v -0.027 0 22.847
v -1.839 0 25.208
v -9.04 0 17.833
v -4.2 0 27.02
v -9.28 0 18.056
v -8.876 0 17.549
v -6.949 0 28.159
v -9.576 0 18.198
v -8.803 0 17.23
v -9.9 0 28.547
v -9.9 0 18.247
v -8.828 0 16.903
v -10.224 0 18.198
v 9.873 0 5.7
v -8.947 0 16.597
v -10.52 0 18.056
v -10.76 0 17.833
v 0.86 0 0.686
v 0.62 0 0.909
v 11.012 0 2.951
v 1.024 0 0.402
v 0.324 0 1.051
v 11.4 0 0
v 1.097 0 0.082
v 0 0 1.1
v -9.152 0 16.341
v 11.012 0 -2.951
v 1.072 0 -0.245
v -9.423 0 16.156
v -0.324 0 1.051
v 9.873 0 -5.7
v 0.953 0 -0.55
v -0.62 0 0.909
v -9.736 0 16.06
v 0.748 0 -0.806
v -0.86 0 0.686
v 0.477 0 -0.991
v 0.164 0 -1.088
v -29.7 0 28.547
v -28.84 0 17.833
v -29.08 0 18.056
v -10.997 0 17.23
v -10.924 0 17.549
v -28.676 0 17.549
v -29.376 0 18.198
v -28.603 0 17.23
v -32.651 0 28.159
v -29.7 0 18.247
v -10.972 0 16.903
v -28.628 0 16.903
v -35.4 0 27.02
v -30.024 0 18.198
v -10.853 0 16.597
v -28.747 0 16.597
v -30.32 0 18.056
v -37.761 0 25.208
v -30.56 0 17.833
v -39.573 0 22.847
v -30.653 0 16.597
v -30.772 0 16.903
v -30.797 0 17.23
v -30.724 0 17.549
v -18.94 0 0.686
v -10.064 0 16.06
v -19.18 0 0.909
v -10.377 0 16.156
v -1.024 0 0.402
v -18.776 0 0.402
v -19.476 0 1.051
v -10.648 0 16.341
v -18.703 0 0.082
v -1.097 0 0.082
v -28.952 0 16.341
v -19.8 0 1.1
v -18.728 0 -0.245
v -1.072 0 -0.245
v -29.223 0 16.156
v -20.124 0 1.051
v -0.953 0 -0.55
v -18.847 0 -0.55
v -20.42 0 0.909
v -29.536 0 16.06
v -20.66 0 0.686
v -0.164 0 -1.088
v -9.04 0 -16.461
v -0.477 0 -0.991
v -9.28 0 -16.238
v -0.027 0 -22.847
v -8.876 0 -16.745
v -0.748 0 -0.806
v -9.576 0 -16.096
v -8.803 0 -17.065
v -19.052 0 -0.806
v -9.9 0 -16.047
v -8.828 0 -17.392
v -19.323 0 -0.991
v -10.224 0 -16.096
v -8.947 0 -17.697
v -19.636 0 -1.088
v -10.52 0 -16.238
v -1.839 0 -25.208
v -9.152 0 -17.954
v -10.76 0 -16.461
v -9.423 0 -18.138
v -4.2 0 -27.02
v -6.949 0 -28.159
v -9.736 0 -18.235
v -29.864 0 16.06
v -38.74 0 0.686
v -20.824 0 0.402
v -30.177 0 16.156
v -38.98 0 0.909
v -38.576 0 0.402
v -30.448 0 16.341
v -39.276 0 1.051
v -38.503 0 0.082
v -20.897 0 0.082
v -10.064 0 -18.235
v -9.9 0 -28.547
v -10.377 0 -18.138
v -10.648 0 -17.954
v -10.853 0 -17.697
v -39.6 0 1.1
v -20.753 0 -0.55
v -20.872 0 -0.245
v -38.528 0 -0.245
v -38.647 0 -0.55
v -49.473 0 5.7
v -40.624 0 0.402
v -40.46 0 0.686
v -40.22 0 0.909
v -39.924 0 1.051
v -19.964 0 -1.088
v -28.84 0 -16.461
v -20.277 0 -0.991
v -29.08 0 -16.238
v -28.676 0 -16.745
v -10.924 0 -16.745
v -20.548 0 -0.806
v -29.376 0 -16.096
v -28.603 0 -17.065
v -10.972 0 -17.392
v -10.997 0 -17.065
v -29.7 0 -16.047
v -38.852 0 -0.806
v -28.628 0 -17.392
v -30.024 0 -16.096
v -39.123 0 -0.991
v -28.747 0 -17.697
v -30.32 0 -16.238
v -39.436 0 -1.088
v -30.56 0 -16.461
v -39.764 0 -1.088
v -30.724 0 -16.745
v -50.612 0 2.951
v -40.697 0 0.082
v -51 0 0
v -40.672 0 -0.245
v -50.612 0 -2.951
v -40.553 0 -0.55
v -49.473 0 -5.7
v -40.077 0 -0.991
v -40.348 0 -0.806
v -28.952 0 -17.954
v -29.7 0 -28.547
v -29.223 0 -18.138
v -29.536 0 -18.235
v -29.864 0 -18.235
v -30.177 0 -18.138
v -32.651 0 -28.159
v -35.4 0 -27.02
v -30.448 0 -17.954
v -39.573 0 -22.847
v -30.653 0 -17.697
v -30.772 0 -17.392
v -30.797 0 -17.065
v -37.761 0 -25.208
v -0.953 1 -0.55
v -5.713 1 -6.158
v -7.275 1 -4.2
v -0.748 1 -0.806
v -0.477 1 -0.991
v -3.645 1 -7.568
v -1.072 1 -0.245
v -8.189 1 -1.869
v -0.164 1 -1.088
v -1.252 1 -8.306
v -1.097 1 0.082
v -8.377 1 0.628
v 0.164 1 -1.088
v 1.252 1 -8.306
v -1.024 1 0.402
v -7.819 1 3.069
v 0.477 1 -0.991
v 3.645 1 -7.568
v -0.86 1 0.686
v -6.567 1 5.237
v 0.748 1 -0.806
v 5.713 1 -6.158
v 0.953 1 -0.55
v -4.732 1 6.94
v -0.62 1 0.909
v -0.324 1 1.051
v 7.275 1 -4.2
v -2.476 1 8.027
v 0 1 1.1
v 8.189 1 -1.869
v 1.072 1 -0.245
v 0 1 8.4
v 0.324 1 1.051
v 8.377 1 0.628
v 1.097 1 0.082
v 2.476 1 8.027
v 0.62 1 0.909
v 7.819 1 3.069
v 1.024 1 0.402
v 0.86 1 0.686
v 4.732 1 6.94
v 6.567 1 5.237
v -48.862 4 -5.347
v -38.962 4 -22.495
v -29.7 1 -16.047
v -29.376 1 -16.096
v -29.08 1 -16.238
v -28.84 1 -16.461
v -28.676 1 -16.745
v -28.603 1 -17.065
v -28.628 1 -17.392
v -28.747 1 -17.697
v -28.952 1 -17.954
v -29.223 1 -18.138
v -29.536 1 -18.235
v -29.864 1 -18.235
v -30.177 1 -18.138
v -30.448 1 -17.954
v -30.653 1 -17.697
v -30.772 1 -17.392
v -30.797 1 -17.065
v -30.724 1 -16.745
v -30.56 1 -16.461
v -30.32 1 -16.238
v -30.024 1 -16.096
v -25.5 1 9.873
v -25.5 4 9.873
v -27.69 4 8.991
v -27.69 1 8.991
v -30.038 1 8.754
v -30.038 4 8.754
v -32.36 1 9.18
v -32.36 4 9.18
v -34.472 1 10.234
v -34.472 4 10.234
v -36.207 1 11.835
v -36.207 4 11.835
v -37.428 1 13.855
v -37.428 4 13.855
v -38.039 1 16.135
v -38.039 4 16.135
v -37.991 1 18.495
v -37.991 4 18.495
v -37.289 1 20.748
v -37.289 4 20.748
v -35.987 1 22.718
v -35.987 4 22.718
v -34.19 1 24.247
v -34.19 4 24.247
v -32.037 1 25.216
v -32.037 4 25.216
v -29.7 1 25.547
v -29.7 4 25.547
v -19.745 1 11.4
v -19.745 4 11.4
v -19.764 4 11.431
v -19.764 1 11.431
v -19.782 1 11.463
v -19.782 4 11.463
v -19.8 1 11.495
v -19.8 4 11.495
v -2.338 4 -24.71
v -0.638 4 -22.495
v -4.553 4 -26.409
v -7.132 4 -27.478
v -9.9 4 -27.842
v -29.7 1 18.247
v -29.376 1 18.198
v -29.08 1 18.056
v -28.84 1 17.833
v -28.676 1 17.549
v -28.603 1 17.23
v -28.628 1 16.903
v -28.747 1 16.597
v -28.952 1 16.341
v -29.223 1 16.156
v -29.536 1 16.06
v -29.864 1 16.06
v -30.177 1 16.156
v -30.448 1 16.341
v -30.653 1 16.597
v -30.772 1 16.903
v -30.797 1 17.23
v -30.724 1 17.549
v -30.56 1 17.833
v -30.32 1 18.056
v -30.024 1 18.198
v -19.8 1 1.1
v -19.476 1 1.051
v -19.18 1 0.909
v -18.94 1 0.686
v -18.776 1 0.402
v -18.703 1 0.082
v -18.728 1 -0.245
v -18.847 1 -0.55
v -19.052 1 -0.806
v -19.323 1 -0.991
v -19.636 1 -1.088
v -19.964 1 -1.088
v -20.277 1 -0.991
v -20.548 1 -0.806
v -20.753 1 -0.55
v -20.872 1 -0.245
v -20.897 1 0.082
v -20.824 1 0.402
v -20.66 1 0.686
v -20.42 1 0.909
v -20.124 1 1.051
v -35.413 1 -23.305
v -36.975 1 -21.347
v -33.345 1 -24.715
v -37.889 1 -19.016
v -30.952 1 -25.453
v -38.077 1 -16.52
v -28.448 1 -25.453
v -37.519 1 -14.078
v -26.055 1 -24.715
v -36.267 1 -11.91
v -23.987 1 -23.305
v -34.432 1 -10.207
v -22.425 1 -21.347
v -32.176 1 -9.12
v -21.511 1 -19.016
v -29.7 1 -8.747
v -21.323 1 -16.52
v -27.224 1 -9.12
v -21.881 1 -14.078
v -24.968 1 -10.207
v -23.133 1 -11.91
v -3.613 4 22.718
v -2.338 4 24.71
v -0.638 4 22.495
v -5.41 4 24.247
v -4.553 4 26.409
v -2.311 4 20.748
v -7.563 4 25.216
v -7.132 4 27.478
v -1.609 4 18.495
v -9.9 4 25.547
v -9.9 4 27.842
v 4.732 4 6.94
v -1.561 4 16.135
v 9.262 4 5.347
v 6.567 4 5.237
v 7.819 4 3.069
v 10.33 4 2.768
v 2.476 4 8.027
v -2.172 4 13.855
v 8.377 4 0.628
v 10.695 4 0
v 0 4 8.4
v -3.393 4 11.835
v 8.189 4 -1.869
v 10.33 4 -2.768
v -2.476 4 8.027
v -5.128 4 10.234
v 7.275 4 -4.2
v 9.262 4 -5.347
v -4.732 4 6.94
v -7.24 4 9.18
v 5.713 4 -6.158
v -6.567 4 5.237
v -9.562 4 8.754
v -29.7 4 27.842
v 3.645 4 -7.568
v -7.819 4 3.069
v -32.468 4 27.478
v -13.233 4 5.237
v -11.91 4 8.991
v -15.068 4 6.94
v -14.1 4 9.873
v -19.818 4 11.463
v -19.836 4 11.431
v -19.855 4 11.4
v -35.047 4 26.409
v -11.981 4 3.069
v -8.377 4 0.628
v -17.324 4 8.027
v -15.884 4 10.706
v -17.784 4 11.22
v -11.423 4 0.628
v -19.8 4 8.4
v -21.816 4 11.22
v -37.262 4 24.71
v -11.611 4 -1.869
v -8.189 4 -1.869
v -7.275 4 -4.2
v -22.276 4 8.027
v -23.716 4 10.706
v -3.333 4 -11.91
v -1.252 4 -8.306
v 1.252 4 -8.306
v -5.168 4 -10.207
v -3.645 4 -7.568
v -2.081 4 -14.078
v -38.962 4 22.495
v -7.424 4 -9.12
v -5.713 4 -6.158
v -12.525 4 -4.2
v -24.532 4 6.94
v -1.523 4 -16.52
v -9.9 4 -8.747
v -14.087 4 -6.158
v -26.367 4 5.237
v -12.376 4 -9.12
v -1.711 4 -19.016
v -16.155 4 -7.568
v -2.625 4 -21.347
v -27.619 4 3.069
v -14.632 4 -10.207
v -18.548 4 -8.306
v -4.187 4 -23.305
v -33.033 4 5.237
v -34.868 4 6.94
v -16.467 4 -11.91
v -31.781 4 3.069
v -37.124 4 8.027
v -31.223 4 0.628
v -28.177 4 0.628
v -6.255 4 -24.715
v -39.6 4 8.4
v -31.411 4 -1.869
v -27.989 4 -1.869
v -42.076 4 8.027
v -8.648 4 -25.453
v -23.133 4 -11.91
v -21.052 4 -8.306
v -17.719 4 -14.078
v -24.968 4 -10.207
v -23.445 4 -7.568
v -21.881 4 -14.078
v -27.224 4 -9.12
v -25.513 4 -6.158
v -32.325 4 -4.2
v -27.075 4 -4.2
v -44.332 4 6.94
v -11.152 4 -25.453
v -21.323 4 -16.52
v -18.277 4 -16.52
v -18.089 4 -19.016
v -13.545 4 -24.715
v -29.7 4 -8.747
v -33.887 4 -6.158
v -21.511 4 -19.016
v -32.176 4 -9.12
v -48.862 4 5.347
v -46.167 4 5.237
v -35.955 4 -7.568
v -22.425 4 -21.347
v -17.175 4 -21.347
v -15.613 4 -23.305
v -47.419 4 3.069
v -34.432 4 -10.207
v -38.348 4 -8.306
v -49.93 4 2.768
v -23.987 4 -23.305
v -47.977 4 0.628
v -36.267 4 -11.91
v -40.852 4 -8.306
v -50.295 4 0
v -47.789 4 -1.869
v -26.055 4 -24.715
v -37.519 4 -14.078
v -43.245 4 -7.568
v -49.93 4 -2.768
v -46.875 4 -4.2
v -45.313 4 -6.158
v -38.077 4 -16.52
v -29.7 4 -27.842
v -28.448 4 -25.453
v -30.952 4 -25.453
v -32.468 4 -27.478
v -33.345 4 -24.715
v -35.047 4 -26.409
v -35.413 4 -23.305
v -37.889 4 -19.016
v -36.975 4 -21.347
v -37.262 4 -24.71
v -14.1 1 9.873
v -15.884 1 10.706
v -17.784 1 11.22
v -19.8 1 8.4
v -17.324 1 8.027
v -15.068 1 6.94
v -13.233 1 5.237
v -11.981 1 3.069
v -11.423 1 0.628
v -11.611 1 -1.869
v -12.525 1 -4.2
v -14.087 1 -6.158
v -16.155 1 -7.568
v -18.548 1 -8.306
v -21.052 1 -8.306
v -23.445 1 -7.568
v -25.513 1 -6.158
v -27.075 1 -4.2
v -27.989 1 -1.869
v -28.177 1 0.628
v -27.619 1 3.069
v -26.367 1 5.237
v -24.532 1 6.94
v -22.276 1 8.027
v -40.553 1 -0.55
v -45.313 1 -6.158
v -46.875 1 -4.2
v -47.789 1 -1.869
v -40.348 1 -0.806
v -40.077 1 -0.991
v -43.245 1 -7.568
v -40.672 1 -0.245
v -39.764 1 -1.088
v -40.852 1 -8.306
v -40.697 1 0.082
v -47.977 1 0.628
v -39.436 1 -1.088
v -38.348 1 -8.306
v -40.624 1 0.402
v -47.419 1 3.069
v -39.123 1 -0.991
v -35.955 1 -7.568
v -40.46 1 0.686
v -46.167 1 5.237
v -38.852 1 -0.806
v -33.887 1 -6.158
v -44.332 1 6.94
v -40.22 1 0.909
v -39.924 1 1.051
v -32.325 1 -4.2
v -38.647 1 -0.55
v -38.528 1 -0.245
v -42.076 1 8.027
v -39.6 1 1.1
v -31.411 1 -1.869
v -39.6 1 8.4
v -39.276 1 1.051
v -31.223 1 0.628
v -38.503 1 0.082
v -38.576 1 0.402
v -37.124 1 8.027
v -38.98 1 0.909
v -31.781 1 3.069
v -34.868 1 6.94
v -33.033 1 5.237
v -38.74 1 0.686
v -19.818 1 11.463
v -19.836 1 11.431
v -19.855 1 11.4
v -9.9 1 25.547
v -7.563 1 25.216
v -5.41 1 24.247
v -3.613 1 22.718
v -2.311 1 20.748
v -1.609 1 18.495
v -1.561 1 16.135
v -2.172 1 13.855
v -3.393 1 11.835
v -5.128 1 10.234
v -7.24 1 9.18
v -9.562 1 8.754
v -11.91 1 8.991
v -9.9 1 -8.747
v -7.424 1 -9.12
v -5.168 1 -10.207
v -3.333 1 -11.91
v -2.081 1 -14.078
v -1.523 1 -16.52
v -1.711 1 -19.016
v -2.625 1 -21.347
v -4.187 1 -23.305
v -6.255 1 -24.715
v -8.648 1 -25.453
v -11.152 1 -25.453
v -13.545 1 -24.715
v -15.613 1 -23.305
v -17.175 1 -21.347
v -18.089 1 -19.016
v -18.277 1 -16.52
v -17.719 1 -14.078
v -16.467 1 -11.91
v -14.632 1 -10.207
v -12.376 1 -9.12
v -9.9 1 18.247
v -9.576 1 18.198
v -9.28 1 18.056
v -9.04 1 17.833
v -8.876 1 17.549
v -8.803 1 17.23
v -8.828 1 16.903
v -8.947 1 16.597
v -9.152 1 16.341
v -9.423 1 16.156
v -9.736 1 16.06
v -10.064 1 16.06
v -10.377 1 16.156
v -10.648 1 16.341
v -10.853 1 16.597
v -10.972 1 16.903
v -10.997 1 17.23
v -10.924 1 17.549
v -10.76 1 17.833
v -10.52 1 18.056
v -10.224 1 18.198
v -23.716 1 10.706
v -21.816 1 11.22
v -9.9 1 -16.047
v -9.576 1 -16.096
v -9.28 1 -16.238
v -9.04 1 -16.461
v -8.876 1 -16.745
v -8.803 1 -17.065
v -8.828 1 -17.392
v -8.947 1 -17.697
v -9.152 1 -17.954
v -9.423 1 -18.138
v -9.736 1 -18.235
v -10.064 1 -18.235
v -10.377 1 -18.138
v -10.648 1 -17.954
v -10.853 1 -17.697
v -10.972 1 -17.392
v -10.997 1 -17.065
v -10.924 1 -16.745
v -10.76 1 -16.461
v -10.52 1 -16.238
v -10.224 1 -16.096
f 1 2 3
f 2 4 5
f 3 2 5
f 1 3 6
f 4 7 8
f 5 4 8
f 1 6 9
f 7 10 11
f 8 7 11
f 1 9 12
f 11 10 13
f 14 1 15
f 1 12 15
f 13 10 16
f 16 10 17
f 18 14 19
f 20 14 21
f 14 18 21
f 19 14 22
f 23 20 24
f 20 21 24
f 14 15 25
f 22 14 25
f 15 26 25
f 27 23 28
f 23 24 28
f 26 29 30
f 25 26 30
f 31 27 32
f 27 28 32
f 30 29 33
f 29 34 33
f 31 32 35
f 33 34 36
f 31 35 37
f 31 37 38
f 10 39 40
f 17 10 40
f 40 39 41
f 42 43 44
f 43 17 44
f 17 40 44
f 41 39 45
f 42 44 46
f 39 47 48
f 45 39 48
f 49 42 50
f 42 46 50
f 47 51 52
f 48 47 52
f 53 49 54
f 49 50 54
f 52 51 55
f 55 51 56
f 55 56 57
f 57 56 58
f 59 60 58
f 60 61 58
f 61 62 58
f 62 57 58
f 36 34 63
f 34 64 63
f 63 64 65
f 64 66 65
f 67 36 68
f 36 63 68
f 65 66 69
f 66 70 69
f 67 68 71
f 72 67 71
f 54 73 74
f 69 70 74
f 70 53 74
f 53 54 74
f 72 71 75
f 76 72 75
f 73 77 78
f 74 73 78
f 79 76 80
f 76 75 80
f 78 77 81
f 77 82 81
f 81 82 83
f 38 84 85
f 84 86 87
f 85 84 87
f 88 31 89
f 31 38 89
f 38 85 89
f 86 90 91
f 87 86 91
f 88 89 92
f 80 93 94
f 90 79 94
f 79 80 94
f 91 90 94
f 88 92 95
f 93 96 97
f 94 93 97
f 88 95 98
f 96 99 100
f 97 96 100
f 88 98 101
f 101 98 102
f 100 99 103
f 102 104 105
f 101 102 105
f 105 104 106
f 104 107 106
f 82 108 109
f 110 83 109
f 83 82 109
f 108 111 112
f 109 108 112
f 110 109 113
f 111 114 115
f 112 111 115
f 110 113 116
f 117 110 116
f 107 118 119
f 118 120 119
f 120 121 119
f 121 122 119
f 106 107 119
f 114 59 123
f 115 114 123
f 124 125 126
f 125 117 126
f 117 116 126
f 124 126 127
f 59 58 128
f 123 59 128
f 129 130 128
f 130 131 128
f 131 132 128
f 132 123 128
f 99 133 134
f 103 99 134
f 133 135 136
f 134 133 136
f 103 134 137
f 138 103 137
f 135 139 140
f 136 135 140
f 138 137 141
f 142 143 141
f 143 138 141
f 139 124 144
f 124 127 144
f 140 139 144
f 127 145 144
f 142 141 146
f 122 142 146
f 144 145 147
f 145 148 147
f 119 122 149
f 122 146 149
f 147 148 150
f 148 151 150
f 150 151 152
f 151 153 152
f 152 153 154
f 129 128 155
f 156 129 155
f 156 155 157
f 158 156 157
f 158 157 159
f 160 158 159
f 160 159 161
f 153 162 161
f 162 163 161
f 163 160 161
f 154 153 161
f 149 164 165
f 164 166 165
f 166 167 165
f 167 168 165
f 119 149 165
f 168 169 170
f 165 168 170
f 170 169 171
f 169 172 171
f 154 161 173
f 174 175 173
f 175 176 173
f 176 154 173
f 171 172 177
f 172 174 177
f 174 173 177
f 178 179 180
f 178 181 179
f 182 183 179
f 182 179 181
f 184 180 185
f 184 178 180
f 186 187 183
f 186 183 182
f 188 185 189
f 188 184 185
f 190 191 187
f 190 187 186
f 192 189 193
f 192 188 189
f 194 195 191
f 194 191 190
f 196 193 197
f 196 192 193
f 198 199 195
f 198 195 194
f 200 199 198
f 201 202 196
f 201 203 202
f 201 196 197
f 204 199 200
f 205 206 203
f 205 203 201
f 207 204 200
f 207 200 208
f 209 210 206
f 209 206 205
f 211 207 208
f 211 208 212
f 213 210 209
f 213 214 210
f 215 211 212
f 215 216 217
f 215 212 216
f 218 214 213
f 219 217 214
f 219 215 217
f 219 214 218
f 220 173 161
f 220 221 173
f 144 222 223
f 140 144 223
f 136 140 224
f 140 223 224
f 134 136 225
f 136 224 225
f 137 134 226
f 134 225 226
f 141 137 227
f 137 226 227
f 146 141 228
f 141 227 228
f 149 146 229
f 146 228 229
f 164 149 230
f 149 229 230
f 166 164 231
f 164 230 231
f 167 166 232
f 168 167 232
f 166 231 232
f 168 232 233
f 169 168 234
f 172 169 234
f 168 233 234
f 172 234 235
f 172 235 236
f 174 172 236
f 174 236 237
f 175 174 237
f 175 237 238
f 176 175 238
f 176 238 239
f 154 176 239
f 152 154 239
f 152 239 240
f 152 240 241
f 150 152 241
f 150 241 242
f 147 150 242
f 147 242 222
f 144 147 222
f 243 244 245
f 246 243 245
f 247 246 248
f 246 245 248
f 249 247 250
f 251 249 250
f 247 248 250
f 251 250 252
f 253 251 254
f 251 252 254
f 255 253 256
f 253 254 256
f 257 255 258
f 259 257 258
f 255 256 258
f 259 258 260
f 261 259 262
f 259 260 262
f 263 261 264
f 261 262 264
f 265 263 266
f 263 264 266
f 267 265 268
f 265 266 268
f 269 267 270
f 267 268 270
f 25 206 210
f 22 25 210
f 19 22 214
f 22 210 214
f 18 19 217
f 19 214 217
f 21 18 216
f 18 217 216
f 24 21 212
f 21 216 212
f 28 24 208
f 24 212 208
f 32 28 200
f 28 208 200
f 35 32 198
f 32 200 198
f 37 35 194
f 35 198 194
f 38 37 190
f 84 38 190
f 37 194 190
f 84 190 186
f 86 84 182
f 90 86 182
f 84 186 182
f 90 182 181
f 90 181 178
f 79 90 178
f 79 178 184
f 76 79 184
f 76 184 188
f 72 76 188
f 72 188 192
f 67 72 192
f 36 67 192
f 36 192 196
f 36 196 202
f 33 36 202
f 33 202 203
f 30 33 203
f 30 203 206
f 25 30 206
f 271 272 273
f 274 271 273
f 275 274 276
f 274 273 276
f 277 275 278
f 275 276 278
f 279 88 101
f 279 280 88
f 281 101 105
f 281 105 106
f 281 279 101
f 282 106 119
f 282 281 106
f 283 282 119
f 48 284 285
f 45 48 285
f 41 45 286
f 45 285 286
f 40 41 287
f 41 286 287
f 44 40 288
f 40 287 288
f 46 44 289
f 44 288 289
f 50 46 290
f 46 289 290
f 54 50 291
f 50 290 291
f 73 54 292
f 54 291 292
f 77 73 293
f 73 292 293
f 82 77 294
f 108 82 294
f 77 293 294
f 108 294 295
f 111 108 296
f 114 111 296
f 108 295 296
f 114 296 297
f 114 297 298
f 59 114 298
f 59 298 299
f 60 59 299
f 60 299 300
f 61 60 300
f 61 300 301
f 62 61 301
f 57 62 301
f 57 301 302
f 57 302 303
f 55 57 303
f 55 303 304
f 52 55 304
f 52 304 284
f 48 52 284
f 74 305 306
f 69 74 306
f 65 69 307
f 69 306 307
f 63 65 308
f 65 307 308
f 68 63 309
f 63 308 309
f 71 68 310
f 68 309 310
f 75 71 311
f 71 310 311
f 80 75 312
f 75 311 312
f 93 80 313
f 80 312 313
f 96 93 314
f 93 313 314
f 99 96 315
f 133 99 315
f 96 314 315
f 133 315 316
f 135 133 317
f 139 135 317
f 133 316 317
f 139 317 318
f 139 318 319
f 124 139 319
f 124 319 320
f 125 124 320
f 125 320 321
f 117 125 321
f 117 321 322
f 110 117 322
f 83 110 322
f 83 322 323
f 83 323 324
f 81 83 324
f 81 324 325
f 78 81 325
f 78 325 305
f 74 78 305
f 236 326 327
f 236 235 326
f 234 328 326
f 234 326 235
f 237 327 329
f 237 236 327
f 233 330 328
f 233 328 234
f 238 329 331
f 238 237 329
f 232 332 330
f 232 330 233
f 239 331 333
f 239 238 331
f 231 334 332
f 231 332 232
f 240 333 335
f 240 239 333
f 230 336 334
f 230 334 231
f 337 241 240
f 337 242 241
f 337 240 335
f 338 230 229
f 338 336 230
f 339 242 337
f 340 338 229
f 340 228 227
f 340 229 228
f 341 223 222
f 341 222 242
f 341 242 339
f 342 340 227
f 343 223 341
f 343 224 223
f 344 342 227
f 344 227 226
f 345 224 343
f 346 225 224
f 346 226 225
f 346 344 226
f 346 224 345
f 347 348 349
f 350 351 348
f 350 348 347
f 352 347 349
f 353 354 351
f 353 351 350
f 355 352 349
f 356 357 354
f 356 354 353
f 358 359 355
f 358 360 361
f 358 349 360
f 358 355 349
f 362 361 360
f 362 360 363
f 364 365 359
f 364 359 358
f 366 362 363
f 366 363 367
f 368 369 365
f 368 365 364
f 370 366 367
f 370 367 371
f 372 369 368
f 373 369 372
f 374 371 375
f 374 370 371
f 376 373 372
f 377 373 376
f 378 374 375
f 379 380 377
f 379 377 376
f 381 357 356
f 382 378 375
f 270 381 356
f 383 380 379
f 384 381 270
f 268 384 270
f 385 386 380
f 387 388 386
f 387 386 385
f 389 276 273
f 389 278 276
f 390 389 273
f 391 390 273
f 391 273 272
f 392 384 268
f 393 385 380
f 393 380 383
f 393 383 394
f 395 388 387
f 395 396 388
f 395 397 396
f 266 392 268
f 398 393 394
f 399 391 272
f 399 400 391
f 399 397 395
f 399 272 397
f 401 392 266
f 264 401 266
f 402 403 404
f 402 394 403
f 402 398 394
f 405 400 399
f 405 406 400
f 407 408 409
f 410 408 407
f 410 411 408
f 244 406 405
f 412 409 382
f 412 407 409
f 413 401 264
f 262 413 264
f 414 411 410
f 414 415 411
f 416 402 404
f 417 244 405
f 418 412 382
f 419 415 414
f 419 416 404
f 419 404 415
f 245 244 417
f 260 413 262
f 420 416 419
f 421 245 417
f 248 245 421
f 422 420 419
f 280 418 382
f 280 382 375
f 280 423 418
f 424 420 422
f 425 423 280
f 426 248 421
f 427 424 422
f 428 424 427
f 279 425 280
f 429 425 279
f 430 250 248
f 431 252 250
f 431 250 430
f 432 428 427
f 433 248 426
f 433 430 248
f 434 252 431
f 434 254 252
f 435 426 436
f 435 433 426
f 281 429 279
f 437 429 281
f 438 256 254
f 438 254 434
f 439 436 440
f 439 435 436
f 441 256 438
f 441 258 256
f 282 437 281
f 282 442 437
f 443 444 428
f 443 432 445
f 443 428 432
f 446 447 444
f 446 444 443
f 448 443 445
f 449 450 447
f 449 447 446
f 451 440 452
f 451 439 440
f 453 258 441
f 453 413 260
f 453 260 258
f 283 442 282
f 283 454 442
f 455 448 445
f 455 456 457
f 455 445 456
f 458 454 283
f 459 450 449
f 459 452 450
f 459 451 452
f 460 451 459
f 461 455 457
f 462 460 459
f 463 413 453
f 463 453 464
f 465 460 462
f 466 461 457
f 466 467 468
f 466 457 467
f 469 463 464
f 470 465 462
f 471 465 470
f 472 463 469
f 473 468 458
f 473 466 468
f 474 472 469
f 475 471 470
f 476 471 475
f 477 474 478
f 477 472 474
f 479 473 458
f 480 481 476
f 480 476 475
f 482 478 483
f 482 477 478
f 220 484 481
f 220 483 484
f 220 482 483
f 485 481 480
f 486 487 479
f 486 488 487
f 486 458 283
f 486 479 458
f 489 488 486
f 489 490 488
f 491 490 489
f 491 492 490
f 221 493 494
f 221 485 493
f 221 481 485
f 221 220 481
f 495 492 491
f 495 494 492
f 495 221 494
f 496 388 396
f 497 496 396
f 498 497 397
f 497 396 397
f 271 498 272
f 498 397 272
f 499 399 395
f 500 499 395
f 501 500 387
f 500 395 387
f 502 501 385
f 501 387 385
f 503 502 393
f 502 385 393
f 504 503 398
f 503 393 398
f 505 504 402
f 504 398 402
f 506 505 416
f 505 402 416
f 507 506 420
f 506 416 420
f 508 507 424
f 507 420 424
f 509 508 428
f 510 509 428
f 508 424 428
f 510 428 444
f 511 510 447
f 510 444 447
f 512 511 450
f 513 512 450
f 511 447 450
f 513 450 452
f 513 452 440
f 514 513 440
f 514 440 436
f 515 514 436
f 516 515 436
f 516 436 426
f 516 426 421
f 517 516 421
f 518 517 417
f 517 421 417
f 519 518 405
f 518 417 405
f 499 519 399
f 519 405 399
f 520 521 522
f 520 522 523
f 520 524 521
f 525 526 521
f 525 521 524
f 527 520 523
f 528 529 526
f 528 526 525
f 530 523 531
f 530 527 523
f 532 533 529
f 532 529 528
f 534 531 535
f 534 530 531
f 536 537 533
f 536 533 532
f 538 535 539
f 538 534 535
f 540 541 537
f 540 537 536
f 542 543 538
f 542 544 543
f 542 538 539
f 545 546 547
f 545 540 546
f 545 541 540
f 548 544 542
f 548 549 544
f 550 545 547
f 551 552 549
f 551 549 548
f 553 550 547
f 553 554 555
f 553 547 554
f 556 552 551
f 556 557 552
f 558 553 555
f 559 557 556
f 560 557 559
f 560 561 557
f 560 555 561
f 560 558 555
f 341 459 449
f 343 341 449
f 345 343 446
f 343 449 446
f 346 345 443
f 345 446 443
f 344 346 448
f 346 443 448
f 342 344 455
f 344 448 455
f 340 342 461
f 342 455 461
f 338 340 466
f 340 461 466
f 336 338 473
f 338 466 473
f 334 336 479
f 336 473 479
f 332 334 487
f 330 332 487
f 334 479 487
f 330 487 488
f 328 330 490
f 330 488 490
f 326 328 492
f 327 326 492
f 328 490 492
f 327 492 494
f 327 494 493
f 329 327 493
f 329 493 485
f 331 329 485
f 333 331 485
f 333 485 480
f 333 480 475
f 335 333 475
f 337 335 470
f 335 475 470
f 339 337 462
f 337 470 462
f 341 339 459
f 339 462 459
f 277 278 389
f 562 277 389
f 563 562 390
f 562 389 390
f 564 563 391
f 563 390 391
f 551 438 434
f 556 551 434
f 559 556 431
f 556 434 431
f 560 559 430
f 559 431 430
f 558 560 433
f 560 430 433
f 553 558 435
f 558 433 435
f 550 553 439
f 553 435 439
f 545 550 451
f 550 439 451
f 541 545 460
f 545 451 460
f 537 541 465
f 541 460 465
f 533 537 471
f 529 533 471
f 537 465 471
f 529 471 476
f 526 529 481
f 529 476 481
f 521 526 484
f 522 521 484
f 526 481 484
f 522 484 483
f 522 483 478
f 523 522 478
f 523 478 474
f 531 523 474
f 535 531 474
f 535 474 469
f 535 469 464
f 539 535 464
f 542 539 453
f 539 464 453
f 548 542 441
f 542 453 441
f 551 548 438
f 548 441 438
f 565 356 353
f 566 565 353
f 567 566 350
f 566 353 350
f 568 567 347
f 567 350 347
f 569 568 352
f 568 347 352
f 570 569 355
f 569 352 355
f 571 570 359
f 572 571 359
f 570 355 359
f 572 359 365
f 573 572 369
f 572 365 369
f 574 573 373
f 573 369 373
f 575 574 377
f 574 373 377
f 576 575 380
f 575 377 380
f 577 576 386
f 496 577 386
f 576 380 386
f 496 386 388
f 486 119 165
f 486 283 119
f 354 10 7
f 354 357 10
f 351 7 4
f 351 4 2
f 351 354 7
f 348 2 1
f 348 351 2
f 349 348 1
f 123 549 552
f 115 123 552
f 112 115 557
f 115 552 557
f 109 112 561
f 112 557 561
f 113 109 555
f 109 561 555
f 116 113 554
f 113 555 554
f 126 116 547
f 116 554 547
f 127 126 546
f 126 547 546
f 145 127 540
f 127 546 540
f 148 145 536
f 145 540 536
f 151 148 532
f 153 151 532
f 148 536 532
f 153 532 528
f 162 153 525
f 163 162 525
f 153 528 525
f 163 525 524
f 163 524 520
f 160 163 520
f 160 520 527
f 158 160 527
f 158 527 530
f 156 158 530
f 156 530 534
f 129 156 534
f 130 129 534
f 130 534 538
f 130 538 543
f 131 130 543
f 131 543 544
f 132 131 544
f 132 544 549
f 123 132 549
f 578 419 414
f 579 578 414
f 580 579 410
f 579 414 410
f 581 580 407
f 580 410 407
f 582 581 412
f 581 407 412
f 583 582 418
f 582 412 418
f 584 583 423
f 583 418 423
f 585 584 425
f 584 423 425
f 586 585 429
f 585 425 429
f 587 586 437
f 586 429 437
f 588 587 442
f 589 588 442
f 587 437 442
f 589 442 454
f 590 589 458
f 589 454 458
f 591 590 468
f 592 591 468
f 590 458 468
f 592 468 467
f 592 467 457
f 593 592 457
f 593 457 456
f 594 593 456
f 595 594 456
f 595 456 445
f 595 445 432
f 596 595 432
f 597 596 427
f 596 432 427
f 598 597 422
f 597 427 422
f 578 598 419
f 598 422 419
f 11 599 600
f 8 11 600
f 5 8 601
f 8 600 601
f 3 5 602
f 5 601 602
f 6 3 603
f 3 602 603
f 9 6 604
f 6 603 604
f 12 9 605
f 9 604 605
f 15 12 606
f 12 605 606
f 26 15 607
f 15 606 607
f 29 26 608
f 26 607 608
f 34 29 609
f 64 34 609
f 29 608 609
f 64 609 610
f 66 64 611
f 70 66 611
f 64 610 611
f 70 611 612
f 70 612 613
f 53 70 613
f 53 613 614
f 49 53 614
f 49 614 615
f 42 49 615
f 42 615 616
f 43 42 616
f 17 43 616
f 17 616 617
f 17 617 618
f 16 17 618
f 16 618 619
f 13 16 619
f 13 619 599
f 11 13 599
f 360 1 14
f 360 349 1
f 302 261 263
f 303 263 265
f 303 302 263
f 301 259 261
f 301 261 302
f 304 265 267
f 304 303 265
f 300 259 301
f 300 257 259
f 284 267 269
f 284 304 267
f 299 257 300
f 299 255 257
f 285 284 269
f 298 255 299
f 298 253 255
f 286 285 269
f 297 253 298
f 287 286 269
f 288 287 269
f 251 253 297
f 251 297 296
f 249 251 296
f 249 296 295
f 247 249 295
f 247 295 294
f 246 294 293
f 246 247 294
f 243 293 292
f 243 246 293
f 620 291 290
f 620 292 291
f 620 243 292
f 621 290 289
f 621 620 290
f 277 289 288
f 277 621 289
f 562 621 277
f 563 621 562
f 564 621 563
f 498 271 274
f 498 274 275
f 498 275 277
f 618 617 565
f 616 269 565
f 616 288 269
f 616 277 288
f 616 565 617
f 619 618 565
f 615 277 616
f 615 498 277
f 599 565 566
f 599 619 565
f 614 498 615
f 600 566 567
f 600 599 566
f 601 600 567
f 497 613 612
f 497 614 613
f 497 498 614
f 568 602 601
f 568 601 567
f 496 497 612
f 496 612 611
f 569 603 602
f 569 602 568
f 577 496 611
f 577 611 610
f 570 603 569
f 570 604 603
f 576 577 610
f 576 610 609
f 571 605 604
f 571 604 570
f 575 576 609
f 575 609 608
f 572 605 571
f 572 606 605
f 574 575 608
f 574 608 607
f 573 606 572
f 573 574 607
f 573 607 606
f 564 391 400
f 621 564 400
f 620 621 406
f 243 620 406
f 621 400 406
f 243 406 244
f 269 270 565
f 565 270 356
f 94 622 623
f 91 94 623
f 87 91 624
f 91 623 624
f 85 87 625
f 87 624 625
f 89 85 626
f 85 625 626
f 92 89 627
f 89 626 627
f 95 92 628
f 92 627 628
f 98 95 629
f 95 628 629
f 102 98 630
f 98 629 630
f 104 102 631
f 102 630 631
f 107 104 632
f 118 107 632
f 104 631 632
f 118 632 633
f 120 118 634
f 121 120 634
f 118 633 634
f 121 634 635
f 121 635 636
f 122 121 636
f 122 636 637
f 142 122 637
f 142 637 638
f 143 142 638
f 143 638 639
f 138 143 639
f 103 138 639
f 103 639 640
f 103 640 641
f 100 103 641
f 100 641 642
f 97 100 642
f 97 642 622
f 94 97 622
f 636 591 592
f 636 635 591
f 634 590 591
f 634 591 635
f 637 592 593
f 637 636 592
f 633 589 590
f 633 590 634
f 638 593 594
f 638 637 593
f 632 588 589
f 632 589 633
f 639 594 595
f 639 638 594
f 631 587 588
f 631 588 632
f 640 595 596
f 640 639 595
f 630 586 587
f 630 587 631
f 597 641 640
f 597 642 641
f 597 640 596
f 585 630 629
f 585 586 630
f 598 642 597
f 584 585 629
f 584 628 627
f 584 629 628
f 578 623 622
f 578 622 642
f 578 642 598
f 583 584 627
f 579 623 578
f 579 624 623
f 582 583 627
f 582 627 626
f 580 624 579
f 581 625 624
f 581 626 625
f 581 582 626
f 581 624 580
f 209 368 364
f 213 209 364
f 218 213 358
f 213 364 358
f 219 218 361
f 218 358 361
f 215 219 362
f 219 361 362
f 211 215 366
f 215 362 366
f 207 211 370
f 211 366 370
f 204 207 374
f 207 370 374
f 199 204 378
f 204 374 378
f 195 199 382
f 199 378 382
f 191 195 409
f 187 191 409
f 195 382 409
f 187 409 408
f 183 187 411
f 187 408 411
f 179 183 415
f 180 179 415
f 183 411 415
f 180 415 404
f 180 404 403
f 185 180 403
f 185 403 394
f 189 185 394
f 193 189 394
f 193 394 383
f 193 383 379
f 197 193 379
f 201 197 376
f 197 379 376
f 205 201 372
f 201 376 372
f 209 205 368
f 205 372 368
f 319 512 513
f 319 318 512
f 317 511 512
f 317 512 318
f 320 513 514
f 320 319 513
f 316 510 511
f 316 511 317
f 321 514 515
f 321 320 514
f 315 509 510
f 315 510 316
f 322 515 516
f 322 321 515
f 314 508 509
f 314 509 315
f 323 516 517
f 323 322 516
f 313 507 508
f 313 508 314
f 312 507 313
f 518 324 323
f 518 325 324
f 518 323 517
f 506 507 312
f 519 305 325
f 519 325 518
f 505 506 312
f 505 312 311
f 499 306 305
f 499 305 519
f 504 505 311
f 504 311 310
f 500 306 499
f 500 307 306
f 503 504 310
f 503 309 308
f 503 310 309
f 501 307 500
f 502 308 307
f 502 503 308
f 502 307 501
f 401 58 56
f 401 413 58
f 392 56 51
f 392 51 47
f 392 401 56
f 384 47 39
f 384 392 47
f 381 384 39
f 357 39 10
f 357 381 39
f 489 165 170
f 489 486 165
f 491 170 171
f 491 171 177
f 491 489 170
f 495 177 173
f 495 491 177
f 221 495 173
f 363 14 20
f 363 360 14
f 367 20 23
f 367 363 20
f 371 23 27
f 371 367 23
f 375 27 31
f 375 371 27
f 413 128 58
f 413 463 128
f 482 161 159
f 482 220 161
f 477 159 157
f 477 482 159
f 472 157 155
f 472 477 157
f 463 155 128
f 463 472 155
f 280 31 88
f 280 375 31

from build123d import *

# Parameters (mm, degrees)
BOSS_EXTRUDE1_DEPTH = 4
BOSS_EXTRUDE1_TAPER = 10
CUT_EXTRUDE1_START  = 4
SKETCH1_3_R         = 1.1
CUT_EXTRUDE1_DEPTH  = 4
CUT_EXTRUDE2_START  = 4
SKETCH1_4_R         = 8.4
SKETCH1_4_R_2       = 1.1
CUT_EXTRUDE2_DEPTH  = 3


with BuildPart() as part:
    # Sketch1 → Boss-Extrude1 (new body)
    with BuildSketch(Plane(origin=(0, 0, 0), x_dir=(1, 0, 0), z_dir=(0, 1, 0))):
        with BuildLine():
            ThreePointArc((-29.7, 28.547302995), (-35.4, 27.019992598), (-39.572689603, 22.847302995))
            Line((-39.572689603, 22.847302995), (-49.472689603, 5.7))
            ThreePointArc((-49.472689603, 5.7), (-51, 0), (-49.472689603, -5.7))
            Line((-49.472689603, -5.7), (-39.572689603, -22.847302995))
            ThreePointArc((-39.572689603, -22.847302995), (-35.4, -27.019992598), (-29.7, -28.547302995))
            Line((-29.7, -28.547302995), (-9.9, -28.547302995))
            ThreePointArc((-9.9, -28.547302995), (-4.2, -27.019992598), (-0.027310397, -22.847302995))
            Line((-0.027310397, -22.847302995), (9.872689603, -5.7))
            ThreePointArc((9.872689603, -5.7), (11.4, 0), (9.872689603, 5.7))
            Line((9.872689603, 5.7), (-0.027310397, 22.847302995))
            ThreePointArc((-0.027310397, 22.847302995), (-4.2, 27.019992598), (-9.9, 28.547302995))
            Line((-9.9, 28.547302995), (-29.7, 28.547302995))
        make_face()
    extrude(amount=BOSS_EXTRUDE1_DEPTH, taper=BOSS_EXTRUDE1_TAPER)

    # Sketch1<3> → Cut-Extrude1 (cut)
    with BuildSketch(Plane(origin=(0, 0, 0), x_dir=(1, 0, 0), z_dir=(0, 1, 0)).offset(CUT_EXTRUDE1_START)):
        with Locations(Location((-9.9, -17.147302995, 0), (0, 0, 270))):
            Circle(SKETCH1_3_R)
        with Locations(Location((0, 0, 0), (0, 0, 270))):
            Circle(SKETCH1_3_R)
        with Locations(Location((-29.7, -17.147302995, 0), (0, 0, 270))):
            Circle(SKETCH1_3_R)
        with Locations(Location((-39.6, 0, 0), (0, 0, 270))):
            Circle(SKETCH1_3_R)
        with Locations(Location((-9.9, 17.147302995, 0), (0, 0, 270))):
            Circle(SKETCH1_3_R)
        with Locations(Location((-29.7, 17.147302995, 0), (0, 0, 270))):
            Circle(SKETCH1_3_R)
        with Locations(Location((-19.8, 0, 0), (0, 0, 270))):
            Circle(SKETCH1_3_R)
    extrude(amount=-CUT_EXTRUDE1_DEPTH, mode=Mode.SUBTRACT)

    # Sketch1<4> → Cut-Extrude2 (cut)
    # profile 1 of 6: a face of its own
    with BuildSketch(Plane(origin=(0, 0, 0), x_dir=(1, 0, 0), z_dir=(0, 1, 0)).offset(CUT_EXTRUDE2_START)):
        with Locations(Location((0, 0, 0), (0, 0, 270))):
            Circle(SKETCH1_4_R)
        with Locations(Location((0, 0, 0), (0, 0, 270))):
            Circle(SKETCH1_4_R_2, mode=Mode.SUBTRACT)
    # profile 2 of 6: a face of its own
    with BuildSketch(Plane(origin=(0, 0, 0), x_dir=(1, 0, 0), z_dir=(0, 1, 0)).offset(CUT_EXTRUDE2_START)):
        with BuildLine():
            Line((-29.7, -25.547302995), (-9.9, -25.547302995))
            ThreePointArc((-9.9, -25.547302995), (-1.786223222, -14.97322241), (-14.100001087, -9.872690231))
            ThreePointArc((-14.100001087, -9.872690231), (-16.822981756, -11.004424673), (-19.745150662, -11.39986805))
            ThreePointArc((-19.745150662, -11.39986805), (-19.772689603, -11.447302995), (-19.8, -11.494869891))
            ThreePointArc((-19.8, -11.494869891), (-19.827310397, -11.447302995), (-19.854849338, -11.39986805))
            ThreePointArc((-19.854849338, -11.39986805), (-22.777018876, -11.004424502), (-25.500000049, -9.872689575))
            ThreePointArc((-25.500000049, -9.872689575), (-37.813776948, -14.973223043), (-29.7, -25.547302995))
        make_face()
        with Locations(Location((-9.9, -17.147302995, 0), (0, 0, 270))):
            Circle(SKETCH1_4_R_2, mode=Mode.SUBTRACT)
        with Locations(Location((-29.7, -17.147302995, 0), (0, 0, 270))):
            Circle(SKETCH1_4_R_2, mode=Mode.SUBTRACT)
    # profile 3 of 6: a face of its own
    with BuildSketch(Plane(origin=(0, 0, 0), x_dir=(1, 0, 0), z_dir=(0, 1, 0)).offset(CUT_EXTRUDE2_START)):
        with Locations(Location((-9.9, 17.147302995, 0), (0, 0, 270))):
            Circle(SKETCH1_4_R)
        with Locations(Location((-9.9, 17.147302995, 0), (0, 0, 270))):
            Circle(SKETCH1_4_R_2, mode=Mode.SUBTRACT)
    # profile 4 of 6: a face of its own
    with BuildSketch(Plane(origin=(0, 0, 0), x_dir=(1, 0, 0), z_dir=(0, 1, 0)).offset(CUT_EXTRUDE2_START)):
        with Locations(Location((-19.8, 0, 0), (0, 0, 270))):
            Circle(SKETCH1_4_R)
        with Locations(Location((-19.8, 0, 0), (0, 0, 270))):
            Circle(SKETCH1_4_R_2, mode=Mode.SUBTRACT)
    # profile 5 of 6: a face of its own
    with BuildSketch(Plane(origin=(0, 0, 0), x_dir=(1, 0, 0), z_dir=(0, 1, 0)).offset(CUT_EXTRUDE2_START)):
        with Locations(Location((-39.6, 0, 0), (0, 0, 270))):
            Circle(SKETCH1_4_R)
        with Locations(Location((-39.6, 0, 0), (0, 0, 270))):
            Circle(SKETCH1_4_R_2, mode=Mode.SUBTRACT)
    # profile 6 of 6: a face of its own
    with BuildSketch(Plane(origin=(0, 0, 0), x_dir=(1, 0, 0), z_dir=(0, 1, 0)).offset(CUT_EXTRUDE2_START)):
        with Locations(Location((-29.7, 17.147302995, 0), (0, 0, 270))):
            Circle(SKETCH1_4_R)
        with Locations(Location((-29.7, 17.147302995, 0), (0, 0, 270))):
            Circle(SKETCH1_4_R_2, mode=Mode.SUBTRACT)
    extrude(amount=-CUT_EXTRUDE2_DEPTH, mode=Mode.SUBTRACT)


solid = part.part
